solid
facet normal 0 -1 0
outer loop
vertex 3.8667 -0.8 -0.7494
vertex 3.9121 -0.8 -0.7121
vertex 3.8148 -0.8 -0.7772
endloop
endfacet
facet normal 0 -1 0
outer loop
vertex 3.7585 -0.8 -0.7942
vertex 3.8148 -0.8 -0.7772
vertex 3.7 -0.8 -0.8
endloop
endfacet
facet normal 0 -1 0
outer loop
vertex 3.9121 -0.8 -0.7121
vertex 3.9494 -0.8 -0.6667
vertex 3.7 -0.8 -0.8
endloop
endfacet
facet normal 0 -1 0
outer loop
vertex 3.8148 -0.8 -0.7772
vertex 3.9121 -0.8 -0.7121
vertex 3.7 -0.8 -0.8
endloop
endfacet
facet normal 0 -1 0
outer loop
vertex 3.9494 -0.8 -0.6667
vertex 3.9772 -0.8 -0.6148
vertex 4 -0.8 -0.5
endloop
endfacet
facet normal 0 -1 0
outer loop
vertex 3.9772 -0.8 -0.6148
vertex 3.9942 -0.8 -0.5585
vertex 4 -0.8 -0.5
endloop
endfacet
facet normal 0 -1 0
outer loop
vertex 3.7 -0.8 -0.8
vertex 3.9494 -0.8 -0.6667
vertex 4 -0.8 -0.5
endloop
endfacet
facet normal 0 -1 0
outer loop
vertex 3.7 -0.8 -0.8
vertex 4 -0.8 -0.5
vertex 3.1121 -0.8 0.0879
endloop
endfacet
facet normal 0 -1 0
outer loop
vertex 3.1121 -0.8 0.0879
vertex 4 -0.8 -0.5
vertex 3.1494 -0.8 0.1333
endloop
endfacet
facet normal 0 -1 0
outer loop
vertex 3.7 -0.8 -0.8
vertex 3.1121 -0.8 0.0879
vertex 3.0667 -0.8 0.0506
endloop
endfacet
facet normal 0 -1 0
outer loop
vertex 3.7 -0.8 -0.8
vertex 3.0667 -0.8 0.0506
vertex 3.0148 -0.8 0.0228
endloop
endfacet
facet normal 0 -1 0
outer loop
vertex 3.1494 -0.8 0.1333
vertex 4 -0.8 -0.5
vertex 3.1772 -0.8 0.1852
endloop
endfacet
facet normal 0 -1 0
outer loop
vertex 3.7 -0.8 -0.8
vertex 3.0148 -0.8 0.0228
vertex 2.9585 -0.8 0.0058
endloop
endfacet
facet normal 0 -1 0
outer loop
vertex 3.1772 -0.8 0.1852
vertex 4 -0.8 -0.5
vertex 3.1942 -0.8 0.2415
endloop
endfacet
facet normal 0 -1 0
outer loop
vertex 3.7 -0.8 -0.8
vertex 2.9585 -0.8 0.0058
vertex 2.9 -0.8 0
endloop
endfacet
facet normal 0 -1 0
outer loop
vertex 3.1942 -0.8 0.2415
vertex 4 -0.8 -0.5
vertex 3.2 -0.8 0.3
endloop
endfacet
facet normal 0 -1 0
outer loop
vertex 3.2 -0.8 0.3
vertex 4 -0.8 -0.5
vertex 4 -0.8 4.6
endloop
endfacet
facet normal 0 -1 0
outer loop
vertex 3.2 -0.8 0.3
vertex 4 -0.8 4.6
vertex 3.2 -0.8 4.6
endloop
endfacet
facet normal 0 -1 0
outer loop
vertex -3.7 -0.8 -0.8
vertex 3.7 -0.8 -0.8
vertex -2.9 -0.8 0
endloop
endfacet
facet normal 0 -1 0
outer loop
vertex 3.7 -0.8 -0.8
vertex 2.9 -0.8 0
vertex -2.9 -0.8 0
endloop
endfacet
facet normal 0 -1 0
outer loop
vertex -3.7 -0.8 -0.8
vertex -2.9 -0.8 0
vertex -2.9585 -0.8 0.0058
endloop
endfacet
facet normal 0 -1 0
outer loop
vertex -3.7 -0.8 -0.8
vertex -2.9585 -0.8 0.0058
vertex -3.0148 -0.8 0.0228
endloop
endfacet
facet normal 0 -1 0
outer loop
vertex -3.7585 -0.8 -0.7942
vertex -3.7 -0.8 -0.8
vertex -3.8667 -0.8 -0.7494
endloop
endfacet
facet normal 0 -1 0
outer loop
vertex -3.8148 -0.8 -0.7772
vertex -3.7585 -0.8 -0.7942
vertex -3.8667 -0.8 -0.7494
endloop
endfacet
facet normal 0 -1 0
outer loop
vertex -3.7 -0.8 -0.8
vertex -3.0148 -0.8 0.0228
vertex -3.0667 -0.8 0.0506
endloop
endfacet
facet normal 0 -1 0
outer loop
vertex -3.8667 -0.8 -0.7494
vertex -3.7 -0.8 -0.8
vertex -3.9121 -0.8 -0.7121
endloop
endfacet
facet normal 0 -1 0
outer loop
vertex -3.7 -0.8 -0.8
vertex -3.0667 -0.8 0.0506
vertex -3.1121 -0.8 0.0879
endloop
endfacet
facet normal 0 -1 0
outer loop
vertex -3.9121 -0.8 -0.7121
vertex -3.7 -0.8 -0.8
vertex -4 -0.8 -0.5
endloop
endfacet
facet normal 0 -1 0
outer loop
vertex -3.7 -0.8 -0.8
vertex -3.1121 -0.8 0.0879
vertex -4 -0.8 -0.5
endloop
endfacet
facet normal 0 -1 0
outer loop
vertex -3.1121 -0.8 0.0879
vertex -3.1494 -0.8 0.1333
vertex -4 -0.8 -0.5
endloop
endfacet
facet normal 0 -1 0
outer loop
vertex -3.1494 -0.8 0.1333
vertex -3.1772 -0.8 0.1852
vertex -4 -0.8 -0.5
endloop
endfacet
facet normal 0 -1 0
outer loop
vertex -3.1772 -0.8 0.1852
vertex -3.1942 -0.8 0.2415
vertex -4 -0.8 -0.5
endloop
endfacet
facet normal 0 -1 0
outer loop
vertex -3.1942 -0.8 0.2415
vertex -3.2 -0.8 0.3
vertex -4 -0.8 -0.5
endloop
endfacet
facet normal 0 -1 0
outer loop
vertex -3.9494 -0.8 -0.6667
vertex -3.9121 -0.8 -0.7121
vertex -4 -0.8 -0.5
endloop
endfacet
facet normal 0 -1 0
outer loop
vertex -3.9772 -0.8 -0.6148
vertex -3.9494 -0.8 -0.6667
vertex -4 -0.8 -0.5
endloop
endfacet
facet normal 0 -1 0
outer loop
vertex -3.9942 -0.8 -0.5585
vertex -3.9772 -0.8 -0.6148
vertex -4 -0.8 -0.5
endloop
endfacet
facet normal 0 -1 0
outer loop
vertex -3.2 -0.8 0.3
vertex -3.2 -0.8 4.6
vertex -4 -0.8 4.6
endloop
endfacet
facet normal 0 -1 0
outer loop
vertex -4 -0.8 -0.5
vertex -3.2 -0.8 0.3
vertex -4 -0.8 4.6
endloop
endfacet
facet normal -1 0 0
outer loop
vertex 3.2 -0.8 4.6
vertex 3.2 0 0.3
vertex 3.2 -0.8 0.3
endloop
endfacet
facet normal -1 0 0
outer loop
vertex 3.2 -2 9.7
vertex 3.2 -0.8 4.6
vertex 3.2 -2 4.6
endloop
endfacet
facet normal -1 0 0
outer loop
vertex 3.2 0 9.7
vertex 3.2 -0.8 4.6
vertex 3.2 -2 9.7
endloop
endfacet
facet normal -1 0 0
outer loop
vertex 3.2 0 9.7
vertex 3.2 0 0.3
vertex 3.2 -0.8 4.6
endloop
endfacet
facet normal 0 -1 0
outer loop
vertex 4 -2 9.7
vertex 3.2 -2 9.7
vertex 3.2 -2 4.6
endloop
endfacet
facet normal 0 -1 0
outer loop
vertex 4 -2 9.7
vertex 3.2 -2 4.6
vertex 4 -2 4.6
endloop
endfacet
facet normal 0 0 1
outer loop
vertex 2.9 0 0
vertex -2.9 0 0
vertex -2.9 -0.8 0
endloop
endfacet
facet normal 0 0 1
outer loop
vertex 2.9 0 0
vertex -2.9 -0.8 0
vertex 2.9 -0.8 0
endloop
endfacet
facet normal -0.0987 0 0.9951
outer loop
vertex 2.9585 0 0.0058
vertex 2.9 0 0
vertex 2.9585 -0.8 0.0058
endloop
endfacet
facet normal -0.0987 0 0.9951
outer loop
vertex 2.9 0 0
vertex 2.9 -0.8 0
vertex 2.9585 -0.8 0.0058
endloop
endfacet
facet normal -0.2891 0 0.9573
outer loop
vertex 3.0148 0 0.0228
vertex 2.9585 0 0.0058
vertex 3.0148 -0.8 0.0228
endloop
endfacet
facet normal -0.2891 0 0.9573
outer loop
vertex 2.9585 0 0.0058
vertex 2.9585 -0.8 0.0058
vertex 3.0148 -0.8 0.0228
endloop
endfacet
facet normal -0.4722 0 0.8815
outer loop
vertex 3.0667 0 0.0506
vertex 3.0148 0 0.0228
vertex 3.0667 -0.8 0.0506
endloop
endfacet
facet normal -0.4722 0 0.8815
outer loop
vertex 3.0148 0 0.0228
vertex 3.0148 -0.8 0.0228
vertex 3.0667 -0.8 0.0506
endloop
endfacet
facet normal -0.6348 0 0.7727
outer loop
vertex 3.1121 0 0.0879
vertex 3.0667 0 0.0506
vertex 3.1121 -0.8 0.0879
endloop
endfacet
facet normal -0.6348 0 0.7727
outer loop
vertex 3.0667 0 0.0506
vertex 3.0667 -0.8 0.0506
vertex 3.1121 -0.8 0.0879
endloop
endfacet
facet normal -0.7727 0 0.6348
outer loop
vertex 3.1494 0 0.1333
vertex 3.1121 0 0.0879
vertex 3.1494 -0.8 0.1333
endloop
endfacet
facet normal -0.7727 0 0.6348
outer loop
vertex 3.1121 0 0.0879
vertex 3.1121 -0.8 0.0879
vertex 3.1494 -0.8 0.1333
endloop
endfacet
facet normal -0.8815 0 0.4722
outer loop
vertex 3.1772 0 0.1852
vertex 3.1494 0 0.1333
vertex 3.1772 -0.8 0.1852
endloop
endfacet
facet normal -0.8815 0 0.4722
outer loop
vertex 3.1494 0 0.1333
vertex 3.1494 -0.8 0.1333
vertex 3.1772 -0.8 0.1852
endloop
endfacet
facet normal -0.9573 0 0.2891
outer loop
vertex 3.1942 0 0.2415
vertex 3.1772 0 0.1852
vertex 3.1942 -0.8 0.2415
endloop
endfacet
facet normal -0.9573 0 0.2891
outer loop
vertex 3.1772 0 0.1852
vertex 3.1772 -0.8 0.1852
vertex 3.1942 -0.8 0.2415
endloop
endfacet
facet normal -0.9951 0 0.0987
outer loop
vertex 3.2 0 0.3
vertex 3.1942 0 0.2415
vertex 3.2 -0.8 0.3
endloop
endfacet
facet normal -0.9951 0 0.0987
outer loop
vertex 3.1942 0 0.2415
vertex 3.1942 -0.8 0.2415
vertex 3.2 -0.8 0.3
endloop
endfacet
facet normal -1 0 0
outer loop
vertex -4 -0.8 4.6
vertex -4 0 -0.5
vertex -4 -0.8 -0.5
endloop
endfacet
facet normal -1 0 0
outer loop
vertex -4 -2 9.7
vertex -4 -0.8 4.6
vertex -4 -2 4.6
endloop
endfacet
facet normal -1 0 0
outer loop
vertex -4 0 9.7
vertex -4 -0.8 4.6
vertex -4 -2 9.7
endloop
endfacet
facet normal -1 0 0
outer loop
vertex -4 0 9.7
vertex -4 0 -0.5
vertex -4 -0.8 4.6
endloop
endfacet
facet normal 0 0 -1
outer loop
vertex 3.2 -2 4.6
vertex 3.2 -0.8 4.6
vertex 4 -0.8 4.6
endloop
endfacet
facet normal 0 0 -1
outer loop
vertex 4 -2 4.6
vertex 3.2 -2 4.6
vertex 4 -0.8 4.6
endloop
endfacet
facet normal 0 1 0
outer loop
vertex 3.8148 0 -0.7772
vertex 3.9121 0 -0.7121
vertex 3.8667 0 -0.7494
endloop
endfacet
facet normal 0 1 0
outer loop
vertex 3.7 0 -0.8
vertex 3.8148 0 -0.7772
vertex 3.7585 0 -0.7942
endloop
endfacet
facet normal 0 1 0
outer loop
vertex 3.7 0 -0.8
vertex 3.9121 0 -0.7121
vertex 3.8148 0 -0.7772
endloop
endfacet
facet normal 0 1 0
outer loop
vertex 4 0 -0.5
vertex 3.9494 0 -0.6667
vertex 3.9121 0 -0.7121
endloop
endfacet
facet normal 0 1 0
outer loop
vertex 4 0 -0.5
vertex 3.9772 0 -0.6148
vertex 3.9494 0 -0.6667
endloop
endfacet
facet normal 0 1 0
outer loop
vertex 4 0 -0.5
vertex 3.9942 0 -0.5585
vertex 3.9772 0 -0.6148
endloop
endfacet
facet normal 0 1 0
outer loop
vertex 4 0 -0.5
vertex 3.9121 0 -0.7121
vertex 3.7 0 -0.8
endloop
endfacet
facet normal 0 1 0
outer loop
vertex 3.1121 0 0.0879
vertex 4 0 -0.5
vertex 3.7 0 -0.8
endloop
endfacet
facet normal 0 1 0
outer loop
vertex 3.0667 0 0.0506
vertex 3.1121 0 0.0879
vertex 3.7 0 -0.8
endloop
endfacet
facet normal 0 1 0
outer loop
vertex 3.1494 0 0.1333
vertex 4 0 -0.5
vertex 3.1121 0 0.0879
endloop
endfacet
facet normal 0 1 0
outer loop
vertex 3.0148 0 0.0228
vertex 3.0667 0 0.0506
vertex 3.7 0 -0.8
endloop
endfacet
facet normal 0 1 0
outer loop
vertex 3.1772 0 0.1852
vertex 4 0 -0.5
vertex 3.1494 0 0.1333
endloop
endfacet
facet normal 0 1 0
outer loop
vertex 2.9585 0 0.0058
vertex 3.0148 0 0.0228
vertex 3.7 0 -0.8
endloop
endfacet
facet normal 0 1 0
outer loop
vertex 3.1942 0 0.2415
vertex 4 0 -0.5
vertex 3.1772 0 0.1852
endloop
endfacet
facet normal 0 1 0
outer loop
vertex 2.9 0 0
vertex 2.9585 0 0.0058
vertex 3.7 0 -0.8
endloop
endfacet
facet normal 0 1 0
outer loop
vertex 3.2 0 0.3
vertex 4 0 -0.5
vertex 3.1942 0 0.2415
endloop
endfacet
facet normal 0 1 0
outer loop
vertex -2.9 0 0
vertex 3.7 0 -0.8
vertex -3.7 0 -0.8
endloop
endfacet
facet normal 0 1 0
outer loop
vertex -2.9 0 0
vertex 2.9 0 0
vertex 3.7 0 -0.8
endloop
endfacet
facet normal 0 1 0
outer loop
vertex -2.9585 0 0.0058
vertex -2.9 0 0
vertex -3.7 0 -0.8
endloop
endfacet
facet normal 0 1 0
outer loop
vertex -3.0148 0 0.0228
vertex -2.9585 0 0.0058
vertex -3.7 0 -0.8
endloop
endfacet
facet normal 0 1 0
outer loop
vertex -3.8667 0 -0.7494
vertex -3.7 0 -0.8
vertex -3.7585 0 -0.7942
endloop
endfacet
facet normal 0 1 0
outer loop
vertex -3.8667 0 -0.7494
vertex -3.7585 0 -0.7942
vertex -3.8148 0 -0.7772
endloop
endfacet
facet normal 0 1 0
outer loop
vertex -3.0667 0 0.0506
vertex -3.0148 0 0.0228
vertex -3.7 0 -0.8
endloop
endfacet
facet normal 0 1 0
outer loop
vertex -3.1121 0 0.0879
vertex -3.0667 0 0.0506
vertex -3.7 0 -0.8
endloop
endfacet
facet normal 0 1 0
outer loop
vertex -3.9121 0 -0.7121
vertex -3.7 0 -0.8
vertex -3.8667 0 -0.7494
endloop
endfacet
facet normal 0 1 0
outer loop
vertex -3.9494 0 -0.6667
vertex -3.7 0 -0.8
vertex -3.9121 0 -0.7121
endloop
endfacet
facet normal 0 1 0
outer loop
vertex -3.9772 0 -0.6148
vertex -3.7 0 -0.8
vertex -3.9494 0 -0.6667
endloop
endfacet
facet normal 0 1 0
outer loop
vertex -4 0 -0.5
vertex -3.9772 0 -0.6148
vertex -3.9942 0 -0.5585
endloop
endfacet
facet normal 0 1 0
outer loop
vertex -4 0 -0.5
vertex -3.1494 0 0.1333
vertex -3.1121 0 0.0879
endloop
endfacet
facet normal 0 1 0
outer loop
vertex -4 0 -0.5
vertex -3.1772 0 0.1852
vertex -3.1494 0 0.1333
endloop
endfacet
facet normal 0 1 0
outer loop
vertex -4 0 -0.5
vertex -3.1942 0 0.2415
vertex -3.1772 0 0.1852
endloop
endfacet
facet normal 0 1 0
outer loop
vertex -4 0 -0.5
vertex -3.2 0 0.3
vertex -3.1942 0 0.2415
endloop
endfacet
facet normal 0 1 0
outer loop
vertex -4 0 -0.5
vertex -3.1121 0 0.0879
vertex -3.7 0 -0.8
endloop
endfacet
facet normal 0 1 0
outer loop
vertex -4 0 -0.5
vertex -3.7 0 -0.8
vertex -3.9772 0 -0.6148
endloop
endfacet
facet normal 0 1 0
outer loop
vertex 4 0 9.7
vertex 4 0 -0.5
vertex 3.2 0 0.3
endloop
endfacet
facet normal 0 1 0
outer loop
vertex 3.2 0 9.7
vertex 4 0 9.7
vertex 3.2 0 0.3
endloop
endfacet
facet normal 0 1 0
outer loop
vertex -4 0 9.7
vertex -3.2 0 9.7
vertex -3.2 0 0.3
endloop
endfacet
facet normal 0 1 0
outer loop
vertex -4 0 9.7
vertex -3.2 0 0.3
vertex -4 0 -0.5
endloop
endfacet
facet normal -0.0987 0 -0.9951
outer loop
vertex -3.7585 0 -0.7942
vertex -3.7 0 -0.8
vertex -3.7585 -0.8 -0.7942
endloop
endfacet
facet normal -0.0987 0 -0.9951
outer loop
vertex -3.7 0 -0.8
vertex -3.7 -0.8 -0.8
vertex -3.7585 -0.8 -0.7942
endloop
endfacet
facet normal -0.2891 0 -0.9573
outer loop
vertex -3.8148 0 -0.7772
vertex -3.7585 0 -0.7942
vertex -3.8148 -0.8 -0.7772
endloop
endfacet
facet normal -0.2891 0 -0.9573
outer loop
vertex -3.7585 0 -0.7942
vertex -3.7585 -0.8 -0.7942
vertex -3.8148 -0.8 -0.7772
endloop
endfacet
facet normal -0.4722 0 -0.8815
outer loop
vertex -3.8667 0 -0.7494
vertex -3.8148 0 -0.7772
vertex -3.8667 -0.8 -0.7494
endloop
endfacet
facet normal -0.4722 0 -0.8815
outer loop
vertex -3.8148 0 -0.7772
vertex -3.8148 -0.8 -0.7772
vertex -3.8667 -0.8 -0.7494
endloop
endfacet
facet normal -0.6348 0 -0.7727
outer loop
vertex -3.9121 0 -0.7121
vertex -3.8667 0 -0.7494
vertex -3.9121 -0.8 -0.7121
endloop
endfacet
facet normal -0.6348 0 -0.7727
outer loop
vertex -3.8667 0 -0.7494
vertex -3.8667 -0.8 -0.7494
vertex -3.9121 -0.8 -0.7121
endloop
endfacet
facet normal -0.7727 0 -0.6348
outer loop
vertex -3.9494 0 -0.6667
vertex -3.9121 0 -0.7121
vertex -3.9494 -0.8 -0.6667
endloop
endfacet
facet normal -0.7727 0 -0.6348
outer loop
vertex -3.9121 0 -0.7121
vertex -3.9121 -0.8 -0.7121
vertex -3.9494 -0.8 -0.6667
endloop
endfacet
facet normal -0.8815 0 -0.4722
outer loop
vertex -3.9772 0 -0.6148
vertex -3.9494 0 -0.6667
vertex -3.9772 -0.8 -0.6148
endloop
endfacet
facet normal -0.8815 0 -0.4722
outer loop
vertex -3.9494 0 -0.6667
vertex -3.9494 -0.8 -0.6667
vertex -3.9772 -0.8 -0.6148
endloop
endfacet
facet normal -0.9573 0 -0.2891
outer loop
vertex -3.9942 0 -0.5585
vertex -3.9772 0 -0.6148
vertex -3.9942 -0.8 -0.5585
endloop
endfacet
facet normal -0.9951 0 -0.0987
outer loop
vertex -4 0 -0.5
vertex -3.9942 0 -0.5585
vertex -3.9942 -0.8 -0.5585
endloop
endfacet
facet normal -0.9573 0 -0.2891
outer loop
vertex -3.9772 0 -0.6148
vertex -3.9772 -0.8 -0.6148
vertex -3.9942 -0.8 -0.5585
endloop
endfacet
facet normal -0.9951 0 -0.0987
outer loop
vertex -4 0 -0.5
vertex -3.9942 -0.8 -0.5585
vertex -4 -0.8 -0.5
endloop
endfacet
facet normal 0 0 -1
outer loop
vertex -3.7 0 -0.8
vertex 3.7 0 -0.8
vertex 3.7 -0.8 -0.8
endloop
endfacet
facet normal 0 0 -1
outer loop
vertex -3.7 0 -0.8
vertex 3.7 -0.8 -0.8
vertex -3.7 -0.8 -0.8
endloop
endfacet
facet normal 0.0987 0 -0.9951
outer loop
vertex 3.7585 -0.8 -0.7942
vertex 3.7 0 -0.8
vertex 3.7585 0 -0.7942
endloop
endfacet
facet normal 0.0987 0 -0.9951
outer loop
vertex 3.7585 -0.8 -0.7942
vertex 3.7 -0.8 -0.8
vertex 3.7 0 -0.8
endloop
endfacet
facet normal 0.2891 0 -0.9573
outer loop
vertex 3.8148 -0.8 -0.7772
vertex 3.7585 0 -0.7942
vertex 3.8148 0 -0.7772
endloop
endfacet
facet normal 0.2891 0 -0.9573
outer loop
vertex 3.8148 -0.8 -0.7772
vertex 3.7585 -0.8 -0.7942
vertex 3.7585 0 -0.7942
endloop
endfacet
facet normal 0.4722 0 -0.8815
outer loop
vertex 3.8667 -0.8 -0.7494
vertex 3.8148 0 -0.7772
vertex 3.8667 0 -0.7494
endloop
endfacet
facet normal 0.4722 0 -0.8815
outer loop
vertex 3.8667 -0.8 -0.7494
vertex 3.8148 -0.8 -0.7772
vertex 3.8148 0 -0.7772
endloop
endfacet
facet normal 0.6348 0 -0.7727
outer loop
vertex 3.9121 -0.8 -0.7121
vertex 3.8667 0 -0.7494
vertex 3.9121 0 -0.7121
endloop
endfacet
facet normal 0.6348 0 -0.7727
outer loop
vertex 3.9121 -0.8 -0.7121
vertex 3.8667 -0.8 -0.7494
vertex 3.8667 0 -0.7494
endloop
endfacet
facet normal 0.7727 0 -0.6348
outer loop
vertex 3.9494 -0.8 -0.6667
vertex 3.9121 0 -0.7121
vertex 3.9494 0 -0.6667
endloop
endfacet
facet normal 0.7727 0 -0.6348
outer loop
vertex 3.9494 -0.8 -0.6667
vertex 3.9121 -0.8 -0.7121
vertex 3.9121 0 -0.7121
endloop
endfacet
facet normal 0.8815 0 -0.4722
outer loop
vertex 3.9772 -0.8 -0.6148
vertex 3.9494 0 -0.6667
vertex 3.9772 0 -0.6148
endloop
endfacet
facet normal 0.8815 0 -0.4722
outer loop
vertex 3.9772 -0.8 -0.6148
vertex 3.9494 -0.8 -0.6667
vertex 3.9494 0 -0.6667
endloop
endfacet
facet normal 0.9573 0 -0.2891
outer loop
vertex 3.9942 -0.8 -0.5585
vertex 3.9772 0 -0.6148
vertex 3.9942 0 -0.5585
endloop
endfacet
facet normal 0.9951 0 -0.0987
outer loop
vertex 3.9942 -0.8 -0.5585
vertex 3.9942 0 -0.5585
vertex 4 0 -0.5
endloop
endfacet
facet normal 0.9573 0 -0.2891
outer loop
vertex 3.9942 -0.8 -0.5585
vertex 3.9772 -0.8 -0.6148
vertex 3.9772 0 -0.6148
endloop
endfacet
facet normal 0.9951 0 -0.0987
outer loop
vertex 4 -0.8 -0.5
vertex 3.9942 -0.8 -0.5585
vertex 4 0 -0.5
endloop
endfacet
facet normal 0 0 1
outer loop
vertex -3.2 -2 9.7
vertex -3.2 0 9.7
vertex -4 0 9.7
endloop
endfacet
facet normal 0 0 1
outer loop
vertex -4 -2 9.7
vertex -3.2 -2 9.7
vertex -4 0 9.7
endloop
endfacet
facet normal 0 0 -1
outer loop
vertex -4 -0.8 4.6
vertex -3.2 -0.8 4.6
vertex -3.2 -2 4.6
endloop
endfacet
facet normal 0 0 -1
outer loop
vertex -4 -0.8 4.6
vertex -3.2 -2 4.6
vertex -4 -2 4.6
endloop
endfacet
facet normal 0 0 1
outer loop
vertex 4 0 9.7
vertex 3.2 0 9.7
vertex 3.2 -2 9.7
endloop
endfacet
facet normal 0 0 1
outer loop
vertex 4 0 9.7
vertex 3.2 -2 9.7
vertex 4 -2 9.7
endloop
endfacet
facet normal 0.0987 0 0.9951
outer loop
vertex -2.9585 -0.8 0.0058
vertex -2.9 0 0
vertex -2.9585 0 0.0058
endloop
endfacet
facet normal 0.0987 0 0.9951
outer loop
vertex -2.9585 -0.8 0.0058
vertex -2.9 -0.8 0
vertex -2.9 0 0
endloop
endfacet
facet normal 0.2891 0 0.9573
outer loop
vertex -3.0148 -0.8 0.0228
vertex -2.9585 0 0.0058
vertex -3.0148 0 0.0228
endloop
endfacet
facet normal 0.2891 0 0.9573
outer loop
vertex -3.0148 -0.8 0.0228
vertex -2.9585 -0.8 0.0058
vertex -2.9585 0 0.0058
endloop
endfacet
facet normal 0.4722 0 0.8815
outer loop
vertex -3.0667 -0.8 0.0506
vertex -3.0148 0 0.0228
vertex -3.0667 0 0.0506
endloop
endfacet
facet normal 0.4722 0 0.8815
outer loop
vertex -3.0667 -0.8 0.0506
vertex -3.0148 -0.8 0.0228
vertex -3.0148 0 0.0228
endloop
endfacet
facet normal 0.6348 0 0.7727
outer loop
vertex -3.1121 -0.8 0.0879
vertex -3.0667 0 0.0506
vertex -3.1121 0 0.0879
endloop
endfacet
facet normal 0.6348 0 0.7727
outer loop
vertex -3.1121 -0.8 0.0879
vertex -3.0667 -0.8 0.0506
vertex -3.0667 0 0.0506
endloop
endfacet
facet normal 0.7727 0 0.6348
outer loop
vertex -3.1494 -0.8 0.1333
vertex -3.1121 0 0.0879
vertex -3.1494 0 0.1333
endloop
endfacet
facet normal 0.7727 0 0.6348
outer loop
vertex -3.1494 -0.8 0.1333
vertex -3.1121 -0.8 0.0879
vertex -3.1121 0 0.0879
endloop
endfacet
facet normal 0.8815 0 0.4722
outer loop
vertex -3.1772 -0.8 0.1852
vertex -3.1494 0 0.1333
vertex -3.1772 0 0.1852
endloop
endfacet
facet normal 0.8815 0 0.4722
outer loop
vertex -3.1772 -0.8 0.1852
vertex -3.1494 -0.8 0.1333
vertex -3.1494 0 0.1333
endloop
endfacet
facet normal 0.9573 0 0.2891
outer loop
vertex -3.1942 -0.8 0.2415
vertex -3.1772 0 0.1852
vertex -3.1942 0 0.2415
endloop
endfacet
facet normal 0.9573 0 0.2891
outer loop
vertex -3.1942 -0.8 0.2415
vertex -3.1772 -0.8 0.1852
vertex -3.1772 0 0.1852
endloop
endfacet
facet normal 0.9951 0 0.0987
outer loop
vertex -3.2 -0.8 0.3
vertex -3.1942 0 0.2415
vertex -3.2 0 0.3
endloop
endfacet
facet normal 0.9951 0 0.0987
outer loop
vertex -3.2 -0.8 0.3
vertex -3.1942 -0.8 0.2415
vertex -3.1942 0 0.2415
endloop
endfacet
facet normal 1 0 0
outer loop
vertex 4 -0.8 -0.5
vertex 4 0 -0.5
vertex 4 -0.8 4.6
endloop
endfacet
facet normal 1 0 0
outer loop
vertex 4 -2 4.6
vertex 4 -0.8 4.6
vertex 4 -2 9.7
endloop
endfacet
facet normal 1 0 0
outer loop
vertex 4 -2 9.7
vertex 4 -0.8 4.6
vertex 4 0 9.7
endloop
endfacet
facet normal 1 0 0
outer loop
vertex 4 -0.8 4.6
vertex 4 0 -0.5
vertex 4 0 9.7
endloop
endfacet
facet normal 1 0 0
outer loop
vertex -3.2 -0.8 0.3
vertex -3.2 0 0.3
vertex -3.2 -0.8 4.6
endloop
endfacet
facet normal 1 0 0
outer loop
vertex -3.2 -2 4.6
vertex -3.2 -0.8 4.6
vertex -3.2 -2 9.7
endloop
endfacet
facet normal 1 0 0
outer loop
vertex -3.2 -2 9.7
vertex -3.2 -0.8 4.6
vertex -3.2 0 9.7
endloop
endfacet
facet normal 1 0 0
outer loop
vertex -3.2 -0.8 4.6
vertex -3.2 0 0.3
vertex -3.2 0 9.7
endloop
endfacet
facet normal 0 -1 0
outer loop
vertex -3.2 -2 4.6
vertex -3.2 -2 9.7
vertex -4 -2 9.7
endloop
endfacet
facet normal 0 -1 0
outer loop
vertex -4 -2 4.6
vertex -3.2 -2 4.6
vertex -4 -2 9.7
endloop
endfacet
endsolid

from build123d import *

# Parameters (mm, degrees)
F1_DEPTH = 0.8
F2_R     = 0.3
F3_W     = 0.8
F3_H     = 5.1
F4_DEPTH = 1.2


with BuildPart() as f1:
    # F0 (on Front) → F1 (new body)
    with BuildSketch(Plane.XZ):
        Polygon((3.2, 0), (0, 0), (0, -0.8), (4, -0.8), (4, 9.7), (3.2, 9.7), align=None)
    extrude(amount=F1_DEPTH)

    # F2
    f2_edges = [f1.edges().sort_by_distance(p)[0] for p in [
        (3.2, -0.4, 0),
        (4, -0.4, -0.8),
    ]]
    fillet(f2_edges, radius=F2_R)

    # F3 (on face) → F4 (join)
    with BuildSketch(Plane.XZ.offset(0.8)):
        with Locations((3.6, 7.15)):
            Rectangle(F3_W, F3_H)
    extrude(amount=F4_DEPTH)

    # F5: F1 across face


with BuildPart() as f1_1:
    add(f1.part)
    add(f1.part.mirror(Plane(origin=(0, -0.4, -0.4), x_dir=(0, -1, 0), z_dir=(-1, 0, 0))))


solid = f1_1.part
